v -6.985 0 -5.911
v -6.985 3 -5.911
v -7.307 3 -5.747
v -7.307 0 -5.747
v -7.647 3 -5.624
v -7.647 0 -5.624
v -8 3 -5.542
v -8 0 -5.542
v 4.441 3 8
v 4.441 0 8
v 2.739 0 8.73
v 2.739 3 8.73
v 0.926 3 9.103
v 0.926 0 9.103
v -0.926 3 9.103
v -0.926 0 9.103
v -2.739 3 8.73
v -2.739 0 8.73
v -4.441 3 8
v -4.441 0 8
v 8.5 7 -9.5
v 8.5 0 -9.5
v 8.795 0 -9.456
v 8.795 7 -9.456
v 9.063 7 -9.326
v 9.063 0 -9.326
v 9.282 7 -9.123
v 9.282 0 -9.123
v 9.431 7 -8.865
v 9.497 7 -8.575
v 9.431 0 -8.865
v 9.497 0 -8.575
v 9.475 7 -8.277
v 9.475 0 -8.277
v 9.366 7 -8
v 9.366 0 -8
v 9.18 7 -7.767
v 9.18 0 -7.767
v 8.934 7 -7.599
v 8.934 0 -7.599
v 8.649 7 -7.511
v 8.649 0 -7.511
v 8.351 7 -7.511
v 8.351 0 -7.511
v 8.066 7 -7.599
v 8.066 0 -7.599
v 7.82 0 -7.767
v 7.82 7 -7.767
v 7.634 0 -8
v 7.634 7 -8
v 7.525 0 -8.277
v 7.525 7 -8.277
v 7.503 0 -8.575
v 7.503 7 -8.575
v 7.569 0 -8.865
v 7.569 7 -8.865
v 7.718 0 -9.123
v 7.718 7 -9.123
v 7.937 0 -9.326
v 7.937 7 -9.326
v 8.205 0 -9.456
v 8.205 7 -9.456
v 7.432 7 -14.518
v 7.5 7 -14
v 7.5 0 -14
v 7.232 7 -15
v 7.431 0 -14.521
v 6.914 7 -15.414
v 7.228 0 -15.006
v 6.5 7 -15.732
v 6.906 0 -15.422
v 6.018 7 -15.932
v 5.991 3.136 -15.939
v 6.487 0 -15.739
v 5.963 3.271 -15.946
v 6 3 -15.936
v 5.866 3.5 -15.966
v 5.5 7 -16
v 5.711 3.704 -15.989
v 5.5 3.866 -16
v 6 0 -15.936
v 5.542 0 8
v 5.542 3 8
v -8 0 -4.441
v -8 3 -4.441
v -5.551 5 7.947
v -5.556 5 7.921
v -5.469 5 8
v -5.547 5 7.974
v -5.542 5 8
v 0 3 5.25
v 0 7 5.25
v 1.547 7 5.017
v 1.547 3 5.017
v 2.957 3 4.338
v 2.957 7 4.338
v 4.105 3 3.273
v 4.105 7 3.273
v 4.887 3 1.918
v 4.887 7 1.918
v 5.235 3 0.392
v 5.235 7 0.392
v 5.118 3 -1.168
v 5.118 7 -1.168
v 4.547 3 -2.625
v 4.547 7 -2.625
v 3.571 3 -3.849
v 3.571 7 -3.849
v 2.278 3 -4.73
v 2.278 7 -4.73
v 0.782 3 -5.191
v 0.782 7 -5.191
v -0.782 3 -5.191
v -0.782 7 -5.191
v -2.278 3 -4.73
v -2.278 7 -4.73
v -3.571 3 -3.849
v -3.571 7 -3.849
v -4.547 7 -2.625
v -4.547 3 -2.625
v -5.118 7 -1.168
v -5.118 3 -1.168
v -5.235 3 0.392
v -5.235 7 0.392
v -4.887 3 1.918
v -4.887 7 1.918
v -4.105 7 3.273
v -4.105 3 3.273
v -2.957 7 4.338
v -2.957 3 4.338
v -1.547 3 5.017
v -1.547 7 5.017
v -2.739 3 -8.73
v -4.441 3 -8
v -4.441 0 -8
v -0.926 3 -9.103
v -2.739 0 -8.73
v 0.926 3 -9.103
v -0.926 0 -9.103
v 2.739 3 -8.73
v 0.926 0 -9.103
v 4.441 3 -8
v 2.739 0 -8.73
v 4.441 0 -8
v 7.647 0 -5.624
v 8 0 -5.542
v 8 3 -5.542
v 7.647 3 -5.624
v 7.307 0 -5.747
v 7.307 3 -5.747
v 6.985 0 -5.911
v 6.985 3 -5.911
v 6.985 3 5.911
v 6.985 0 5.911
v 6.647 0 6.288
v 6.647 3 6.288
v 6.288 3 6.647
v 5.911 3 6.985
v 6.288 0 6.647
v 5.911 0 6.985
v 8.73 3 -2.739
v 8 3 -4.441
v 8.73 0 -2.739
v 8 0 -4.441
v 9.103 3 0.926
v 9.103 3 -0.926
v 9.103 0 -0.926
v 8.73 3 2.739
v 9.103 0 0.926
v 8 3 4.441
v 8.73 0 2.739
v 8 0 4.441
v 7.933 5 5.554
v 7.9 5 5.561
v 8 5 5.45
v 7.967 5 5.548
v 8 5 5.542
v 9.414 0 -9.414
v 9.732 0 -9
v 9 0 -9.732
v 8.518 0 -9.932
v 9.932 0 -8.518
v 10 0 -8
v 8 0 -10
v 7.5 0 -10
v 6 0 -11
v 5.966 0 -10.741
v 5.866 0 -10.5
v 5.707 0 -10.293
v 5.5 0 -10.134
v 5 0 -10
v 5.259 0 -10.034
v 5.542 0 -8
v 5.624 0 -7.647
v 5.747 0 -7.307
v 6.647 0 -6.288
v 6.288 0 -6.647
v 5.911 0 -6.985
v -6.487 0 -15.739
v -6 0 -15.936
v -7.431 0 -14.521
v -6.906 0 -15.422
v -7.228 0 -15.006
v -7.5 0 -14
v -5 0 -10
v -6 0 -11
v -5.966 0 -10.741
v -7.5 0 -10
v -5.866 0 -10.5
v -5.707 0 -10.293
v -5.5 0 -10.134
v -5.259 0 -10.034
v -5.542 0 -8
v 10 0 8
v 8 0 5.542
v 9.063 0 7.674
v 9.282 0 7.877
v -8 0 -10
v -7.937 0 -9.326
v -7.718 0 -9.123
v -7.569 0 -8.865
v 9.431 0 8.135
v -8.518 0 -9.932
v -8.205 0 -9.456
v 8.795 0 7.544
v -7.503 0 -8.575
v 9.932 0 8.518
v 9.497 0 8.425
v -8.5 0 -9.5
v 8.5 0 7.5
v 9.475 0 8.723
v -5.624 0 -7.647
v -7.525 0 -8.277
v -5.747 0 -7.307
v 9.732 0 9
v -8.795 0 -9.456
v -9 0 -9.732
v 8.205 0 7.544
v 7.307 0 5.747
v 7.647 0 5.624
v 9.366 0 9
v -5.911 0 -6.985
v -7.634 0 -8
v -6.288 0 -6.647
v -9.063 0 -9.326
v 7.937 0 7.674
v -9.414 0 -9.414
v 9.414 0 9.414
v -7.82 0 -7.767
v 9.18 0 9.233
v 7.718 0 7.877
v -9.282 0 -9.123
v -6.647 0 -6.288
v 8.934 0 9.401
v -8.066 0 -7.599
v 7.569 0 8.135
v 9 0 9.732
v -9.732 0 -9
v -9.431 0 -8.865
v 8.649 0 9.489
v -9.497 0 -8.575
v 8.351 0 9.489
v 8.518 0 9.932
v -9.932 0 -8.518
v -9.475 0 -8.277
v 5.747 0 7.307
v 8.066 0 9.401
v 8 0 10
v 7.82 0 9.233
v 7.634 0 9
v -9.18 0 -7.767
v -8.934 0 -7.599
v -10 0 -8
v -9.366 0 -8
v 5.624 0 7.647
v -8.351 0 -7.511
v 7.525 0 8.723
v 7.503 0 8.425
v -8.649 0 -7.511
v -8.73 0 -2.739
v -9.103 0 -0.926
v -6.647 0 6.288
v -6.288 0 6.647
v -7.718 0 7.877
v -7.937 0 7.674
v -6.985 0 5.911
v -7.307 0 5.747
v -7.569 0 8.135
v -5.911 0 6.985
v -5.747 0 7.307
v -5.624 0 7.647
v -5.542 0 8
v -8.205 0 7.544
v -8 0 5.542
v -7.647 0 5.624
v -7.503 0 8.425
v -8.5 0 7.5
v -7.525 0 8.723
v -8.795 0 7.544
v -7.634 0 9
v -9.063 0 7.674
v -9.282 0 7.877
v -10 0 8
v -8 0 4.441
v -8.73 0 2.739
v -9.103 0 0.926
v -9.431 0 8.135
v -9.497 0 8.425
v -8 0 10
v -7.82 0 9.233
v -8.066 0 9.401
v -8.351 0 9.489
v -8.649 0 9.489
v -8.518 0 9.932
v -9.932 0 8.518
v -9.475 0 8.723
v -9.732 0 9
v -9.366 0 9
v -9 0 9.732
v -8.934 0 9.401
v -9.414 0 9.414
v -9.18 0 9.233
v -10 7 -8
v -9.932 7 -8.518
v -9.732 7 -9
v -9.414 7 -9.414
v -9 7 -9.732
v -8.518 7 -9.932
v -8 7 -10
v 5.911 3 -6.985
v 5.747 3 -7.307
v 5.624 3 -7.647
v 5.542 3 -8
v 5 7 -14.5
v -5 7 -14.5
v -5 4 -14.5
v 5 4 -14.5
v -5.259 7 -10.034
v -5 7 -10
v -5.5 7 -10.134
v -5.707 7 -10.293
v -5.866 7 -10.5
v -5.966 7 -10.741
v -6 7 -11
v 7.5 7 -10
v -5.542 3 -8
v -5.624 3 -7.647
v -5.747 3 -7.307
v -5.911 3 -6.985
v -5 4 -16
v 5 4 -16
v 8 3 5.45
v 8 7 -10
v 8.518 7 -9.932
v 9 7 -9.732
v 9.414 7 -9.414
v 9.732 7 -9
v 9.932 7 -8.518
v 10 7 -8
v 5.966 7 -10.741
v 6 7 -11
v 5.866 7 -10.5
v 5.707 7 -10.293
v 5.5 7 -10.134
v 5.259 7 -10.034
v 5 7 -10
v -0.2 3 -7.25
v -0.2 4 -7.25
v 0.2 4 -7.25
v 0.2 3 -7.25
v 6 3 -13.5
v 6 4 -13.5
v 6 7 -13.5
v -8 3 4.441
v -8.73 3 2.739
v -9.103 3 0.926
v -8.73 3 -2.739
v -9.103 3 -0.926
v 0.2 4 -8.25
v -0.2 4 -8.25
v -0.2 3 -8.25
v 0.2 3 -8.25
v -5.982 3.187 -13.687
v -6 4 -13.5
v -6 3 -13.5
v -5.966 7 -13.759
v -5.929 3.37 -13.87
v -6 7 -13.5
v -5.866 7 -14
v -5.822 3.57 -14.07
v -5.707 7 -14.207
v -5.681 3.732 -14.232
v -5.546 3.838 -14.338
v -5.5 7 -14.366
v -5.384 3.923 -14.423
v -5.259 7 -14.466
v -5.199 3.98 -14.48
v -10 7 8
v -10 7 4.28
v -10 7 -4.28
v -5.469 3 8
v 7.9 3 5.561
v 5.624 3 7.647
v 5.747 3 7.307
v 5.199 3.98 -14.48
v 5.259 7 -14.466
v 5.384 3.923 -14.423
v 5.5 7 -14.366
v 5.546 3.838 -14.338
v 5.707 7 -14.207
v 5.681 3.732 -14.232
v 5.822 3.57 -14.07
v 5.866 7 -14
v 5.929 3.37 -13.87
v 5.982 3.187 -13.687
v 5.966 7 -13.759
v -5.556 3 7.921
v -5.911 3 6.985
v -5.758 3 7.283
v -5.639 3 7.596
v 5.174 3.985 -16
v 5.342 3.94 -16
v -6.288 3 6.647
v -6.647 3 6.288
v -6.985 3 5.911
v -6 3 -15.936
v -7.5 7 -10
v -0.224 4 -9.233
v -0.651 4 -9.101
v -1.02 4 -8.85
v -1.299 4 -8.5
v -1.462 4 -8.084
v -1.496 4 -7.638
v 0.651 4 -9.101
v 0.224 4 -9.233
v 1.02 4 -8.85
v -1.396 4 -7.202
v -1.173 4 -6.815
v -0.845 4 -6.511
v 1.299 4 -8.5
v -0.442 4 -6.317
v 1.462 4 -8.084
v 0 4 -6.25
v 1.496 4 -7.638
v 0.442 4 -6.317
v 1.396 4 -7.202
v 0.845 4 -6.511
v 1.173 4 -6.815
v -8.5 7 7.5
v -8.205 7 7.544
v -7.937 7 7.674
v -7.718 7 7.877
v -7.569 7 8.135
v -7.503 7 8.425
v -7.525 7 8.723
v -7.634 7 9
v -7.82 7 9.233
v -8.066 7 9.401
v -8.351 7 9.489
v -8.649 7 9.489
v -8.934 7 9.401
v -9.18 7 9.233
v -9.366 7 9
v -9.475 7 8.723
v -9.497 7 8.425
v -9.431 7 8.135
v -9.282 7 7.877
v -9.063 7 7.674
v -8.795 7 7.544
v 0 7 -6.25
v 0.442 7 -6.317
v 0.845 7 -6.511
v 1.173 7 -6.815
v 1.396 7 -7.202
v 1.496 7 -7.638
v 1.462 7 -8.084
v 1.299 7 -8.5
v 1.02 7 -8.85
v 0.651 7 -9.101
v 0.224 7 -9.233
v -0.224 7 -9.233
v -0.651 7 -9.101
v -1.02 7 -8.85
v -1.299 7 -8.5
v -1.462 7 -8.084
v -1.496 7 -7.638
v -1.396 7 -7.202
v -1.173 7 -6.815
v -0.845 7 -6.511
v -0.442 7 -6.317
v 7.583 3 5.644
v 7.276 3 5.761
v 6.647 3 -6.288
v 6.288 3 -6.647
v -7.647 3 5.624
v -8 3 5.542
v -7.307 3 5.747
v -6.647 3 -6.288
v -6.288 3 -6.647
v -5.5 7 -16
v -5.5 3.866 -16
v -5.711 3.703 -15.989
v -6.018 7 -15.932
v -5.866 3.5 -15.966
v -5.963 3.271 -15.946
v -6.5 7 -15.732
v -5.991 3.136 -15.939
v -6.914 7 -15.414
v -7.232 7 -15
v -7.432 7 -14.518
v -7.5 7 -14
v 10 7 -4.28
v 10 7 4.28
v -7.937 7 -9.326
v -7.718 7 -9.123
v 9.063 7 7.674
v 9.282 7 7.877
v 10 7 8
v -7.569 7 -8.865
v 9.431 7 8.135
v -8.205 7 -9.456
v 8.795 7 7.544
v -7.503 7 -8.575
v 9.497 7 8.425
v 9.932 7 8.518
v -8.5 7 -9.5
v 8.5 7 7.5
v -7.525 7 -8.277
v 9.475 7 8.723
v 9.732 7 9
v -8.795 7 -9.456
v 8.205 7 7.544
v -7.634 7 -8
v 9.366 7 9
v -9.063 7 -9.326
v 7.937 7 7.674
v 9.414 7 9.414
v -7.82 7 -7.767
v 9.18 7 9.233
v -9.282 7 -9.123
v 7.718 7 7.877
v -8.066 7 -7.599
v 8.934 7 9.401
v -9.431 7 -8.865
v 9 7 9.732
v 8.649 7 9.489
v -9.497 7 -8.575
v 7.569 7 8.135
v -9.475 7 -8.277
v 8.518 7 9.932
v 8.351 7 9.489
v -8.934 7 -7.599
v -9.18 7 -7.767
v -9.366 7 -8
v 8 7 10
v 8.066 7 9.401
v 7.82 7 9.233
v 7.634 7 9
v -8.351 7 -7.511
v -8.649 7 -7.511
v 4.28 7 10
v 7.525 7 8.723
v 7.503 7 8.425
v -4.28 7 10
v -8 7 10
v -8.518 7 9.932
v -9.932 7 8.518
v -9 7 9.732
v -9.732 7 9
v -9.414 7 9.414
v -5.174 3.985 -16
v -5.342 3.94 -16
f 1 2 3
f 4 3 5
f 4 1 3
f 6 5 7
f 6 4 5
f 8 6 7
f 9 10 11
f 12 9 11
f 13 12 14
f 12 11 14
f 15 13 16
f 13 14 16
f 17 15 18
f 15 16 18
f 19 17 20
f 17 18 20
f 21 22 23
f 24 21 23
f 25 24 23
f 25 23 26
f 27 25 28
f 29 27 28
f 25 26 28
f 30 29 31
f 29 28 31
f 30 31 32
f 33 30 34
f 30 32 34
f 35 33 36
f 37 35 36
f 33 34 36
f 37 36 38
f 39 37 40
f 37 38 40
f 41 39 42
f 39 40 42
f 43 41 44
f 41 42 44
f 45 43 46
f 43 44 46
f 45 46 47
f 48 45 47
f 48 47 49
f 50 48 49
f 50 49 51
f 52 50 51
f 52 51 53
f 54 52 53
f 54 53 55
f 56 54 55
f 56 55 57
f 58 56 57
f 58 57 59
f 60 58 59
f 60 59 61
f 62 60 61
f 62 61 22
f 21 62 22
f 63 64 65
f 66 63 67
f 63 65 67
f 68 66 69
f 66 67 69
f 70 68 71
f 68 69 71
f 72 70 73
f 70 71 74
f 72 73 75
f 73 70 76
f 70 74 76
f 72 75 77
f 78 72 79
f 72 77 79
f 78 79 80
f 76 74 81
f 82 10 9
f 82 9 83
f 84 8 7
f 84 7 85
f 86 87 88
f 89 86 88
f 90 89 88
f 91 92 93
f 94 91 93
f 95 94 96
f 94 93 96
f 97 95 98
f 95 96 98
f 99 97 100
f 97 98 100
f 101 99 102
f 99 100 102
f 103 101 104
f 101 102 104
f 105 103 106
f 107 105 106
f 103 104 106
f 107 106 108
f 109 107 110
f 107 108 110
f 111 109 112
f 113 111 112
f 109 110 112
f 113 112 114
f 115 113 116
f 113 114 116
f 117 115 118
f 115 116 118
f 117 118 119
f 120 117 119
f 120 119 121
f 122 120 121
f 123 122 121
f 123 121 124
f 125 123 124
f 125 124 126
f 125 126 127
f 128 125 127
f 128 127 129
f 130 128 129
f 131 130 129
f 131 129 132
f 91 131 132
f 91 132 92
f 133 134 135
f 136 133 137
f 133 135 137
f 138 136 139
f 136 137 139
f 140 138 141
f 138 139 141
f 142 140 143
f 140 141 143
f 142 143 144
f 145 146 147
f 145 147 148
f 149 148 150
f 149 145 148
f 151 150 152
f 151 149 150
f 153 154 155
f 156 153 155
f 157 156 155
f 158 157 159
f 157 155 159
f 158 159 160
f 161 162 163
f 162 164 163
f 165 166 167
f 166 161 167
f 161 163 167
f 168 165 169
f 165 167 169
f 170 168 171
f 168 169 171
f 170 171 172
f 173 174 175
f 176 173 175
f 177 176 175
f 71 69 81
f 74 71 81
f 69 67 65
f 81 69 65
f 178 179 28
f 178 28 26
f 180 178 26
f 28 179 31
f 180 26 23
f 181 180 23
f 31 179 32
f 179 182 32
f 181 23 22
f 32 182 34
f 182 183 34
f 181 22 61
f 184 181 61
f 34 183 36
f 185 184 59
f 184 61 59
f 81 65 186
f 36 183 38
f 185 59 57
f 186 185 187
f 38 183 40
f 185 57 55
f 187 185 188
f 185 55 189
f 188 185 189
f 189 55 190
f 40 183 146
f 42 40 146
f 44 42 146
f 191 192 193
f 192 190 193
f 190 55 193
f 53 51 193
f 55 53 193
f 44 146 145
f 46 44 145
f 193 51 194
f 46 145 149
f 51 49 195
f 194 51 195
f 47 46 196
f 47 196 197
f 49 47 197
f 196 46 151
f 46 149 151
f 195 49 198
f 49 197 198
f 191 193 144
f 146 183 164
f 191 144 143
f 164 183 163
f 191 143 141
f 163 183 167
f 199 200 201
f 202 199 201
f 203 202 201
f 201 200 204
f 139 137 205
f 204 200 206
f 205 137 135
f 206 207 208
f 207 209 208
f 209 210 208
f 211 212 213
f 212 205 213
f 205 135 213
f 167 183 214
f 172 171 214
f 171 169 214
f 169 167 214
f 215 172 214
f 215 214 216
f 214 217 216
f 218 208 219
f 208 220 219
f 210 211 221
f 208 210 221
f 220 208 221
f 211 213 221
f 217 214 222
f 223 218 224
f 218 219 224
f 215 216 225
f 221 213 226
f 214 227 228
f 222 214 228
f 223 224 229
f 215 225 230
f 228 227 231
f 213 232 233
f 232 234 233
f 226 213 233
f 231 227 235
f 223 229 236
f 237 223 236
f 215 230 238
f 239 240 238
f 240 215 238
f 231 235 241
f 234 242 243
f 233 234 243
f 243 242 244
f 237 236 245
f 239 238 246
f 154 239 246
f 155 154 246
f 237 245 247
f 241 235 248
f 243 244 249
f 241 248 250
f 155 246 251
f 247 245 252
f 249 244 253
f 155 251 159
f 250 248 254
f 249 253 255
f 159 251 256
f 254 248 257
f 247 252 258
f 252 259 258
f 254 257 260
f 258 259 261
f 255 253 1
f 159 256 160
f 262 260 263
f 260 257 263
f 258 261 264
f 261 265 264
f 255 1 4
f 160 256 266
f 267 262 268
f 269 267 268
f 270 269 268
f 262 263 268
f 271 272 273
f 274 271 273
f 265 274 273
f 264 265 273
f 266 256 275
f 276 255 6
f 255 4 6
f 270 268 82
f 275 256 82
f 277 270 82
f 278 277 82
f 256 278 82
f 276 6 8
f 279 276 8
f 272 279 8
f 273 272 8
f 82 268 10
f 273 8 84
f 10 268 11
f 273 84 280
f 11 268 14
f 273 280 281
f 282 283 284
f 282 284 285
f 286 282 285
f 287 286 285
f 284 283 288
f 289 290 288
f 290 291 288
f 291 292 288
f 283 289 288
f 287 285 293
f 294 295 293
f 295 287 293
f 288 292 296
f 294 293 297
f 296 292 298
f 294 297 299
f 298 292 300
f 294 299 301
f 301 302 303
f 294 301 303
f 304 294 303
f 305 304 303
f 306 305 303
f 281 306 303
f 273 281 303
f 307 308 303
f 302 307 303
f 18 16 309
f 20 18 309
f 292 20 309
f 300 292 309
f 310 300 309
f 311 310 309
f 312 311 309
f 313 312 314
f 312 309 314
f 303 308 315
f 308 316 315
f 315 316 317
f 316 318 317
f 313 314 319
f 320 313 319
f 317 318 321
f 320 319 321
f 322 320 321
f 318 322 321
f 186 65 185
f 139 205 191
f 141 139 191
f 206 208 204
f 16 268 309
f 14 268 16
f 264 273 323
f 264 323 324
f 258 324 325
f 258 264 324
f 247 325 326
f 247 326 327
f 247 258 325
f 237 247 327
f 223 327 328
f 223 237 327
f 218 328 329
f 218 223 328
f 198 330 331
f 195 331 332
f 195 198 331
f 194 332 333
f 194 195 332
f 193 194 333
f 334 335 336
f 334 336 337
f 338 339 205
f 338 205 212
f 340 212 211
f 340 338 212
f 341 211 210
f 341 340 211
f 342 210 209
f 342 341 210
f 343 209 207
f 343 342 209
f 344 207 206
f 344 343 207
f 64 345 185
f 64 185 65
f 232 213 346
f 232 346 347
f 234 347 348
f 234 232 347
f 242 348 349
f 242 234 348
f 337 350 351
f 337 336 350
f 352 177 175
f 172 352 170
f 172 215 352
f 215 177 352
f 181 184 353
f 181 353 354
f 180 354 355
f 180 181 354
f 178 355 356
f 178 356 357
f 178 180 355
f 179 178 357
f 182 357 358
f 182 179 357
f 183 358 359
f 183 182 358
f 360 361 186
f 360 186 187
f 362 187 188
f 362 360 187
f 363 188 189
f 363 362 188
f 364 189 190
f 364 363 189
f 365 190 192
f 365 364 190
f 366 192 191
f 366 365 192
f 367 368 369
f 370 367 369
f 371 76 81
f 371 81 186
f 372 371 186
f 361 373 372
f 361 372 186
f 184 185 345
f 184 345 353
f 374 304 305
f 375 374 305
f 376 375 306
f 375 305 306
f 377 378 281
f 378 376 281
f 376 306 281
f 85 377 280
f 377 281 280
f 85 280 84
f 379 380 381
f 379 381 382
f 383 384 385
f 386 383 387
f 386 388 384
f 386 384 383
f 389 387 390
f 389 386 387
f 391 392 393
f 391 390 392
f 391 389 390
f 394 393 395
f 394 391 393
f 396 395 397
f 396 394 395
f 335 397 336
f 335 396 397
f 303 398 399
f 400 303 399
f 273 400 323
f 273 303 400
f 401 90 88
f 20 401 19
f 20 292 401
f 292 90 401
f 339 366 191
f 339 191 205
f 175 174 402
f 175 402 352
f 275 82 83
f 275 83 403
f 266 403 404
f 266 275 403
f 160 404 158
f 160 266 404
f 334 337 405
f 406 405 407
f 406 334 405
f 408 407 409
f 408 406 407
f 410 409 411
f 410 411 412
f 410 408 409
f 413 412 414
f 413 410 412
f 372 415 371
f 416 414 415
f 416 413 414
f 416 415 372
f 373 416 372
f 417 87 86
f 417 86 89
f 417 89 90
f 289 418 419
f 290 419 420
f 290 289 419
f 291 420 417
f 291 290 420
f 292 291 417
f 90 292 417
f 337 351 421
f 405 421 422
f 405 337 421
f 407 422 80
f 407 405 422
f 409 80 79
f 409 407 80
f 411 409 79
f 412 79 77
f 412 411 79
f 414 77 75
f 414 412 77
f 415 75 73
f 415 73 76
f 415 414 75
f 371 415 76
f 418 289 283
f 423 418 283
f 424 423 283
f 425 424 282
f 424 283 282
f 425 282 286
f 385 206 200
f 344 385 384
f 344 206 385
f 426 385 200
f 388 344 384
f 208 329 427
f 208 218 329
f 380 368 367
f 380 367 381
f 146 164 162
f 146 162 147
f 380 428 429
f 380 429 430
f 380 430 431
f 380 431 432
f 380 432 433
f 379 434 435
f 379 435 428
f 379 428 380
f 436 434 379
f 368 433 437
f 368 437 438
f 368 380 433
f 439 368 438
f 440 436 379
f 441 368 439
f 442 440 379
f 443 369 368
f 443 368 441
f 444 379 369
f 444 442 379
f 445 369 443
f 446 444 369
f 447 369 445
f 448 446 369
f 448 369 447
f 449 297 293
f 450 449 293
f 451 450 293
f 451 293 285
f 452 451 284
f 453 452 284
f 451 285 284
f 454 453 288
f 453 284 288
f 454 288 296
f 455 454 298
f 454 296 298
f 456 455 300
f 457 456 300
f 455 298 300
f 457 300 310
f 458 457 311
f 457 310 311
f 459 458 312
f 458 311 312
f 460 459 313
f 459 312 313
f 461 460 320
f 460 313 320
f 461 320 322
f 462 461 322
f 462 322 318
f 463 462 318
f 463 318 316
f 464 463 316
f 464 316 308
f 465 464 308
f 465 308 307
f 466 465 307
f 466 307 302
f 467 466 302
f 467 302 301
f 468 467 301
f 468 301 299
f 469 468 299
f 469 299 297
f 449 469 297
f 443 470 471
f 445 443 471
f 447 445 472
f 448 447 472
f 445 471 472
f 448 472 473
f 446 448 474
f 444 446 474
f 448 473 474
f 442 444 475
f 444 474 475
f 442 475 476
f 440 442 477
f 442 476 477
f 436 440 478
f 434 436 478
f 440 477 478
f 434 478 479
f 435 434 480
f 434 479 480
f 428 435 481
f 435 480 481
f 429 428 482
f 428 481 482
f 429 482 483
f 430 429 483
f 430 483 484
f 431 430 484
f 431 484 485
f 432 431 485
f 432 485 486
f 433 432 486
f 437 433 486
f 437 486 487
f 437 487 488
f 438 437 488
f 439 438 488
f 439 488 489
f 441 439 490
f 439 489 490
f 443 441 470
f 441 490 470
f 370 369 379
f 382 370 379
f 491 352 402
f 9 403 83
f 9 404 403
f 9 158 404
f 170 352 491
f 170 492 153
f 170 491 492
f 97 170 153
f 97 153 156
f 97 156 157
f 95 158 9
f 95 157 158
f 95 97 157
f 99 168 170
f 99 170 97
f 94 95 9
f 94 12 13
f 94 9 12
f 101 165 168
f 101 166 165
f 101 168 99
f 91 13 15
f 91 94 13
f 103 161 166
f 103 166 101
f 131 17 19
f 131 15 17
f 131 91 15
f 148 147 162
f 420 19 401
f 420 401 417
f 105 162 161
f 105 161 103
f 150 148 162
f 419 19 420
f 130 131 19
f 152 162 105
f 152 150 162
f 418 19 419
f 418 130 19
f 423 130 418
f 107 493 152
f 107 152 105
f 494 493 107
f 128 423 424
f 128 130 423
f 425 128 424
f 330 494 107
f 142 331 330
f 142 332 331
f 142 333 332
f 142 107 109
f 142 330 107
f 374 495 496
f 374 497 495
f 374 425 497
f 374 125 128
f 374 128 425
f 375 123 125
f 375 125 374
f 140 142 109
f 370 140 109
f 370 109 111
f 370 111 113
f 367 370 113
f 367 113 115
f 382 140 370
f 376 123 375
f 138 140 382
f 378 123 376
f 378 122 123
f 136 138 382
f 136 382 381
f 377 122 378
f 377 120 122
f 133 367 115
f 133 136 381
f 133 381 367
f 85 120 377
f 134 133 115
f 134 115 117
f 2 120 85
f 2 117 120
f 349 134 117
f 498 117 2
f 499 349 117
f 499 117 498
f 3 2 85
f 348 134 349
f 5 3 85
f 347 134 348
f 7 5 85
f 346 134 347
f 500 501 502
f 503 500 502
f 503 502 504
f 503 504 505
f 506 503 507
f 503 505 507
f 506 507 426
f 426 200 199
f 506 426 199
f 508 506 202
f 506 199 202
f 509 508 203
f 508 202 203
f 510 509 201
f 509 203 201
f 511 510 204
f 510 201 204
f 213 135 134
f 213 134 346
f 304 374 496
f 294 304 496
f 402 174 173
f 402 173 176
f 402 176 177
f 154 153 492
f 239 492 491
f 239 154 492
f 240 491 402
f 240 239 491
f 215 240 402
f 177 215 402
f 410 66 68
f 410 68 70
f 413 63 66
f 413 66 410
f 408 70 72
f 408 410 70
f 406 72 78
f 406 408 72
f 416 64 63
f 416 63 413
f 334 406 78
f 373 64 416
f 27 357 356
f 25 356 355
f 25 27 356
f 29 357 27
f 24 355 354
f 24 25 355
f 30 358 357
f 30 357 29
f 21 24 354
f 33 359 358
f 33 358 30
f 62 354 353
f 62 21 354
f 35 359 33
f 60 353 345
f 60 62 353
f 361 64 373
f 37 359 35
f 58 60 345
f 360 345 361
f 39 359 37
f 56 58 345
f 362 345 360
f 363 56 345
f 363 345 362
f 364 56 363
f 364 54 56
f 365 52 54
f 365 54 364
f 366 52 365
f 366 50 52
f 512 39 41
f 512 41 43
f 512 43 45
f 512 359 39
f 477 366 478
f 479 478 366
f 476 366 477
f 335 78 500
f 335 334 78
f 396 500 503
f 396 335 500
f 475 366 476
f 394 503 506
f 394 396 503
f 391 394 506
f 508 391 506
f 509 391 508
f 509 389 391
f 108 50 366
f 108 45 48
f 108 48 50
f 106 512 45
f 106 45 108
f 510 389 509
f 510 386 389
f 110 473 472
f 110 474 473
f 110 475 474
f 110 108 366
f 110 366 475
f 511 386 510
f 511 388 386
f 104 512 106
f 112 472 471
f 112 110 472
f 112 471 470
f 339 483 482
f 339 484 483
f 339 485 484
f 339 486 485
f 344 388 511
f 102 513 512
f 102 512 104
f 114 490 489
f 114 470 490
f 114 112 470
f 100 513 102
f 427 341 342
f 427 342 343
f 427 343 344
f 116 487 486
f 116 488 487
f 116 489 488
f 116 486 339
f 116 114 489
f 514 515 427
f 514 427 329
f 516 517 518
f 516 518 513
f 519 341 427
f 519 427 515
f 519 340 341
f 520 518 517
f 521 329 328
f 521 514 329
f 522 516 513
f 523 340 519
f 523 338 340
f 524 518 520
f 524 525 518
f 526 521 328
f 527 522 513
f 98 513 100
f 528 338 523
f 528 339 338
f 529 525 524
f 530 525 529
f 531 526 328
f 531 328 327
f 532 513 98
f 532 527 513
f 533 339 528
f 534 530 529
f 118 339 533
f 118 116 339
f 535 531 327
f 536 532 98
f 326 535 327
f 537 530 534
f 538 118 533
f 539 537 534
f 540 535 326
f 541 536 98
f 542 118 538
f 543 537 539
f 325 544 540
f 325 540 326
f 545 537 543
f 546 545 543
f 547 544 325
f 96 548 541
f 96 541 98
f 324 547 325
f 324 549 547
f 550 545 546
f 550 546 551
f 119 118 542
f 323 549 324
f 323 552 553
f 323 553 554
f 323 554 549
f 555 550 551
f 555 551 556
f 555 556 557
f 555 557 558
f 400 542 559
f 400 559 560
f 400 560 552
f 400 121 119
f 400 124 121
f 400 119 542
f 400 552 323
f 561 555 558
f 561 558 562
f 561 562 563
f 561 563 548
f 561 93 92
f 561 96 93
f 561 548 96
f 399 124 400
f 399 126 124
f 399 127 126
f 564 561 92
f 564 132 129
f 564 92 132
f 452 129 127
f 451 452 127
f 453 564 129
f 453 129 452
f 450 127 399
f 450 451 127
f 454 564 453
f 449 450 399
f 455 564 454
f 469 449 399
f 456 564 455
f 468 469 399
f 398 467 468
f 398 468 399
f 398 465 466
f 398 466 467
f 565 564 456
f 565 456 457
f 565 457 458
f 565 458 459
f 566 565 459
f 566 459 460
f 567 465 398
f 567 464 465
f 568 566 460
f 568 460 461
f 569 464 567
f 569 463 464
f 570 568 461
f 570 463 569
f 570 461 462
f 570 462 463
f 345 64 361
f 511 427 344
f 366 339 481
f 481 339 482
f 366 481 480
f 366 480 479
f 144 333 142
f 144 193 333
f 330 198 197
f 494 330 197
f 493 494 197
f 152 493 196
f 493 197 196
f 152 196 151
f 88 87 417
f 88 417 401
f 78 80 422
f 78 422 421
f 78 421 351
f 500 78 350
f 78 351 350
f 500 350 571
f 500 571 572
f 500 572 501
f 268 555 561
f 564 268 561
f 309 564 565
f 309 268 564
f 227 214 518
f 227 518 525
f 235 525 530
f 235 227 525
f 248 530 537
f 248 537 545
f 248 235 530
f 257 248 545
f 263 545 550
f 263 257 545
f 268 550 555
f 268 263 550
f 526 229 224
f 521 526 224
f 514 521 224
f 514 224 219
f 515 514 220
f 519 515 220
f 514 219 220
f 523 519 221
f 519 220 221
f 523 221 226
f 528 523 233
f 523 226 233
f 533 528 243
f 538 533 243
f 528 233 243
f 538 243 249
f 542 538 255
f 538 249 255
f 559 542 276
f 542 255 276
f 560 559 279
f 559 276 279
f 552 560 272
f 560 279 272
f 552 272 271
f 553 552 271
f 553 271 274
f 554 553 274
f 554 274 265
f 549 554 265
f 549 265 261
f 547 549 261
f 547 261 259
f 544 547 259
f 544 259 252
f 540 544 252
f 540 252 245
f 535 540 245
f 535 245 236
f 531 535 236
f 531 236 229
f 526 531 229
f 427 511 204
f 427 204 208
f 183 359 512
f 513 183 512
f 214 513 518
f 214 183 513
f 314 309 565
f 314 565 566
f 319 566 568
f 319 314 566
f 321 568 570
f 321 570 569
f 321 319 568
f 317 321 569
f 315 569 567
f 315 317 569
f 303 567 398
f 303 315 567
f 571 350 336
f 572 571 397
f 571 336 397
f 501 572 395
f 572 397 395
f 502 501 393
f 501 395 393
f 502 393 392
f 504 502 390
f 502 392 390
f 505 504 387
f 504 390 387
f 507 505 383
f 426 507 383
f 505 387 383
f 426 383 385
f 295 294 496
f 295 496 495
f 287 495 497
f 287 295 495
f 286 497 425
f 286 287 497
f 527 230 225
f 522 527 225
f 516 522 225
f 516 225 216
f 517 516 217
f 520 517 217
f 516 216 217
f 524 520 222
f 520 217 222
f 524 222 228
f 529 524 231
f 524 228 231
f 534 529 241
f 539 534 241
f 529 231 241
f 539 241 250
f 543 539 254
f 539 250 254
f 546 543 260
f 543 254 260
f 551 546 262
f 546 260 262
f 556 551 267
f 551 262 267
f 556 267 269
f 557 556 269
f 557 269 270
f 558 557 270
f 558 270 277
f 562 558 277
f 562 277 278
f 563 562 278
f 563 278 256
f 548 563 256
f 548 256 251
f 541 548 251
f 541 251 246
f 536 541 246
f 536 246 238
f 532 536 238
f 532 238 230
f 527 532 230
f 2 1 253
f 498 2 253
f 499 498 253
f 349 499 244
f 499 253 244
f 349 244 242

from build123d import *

# Parameters (mm, degrees)
BOSS_EXTRUDE1_DEPTH = 12
SKETCH2_R           = 1
CUT_EXTRUDE1_DEPTH  = 15
SKETCH4_R           = 2.25
CUT_EXTRUDE3_DEPTH  = 5
SHELL1_DEPTH        = 10
SHELL1_2_DEPTH      = 5
SKETCH3_R           = 9.15
CUT_EXTRUDE2_DEPTH  = 3
FILLET1_R           = 2
BOSS_EXTRUDE2_DEPTH = 7
SKETCH7_W           = 12
SKETCH7_H           = 4.549017994
CUT_EXTRUDE4_DEPTH  = 4
SKETCH8_W           = 27.297760414
SKETCH8_H           = 10.352522689
CUT_EXTRUDE5_DEPTH  = 33
BOSS_EXTRUDE8_DEPTH = 4
SKETCH11_R          = 5.5
CUT_EXTRUDE6_DEPTH  = 4
SKETCH12_R          = 1.5
CUT_EXTRUDE7_DEPTH  = 3
SKETCH13_W          = 0.4
SKETCH13_H          = 1
CUT_EXTRUDE8_DEPTH  = 5
CUT_EXTRUDE9_DEPTH  = 15
FILLET2_R           = 1
BOSS_EXTRUDE9_DEPTH = 4
SKETCH16_R          = 5.25
CUT_EXTRUDE10_DEPTH = 5.1


# Read off the part's stored shape, not the designer's step: Shell1
with BuildPart() as part:
    # Sketch1 → Boss-Extrude1 (new body)
    with BuildSketch(Plane(origin=(0, 0, 0), x_dir=(1, 0, 0), z_dir=(0, 1, 0))):
        with BuildLine():
            Line((-8, 10), (8, 10))
            ThreePointArc((8, 10), (9.414213562, 9.414213562), (10, 8))
            Line((10, 8), (10, -8))
            ThreePointArc((10, -8), (9.414213562, -9.414213562), (8, -10))
            Line((8, -10), (-8, -10))
            ThreePointArc((-8, -10), (-9.414213562, -9.414213562), (-10, -8))
            Line((-10, -8), (-10, 8))
            ThreePointArc((-10, 8), (-9.414213562, 9.414213562), (-8, 10))
        make_face()
    extrude(amount=BOSS_EXTRUDE1_DEPTH)

    # Sketch2 → Cut-Extrude1 (cut)
    with BuildSketch(Plane.XZ):
        with Locations(Location((-8.5, 8.5, 0), (0, 0, 270))):
            Circle(SKETCH2_R)
        with Locations(Location((8.5, 8.5, 0), (0, 0, 270))):
            Circle(SKETCH2_R)
        with Locations(Location((8.5, -8.5, 0), (0, 0, 270))):
            Circle(SKETCH2_R)
        with Locations(Location((-8.5, -8.5, 0), (0, 0, 270))):
            Circle(SKETCH2_R)
    extrude(amount=-CUT_EXTRUDE1_DEPTH, mode=Mode.SUBTRACT)

    # Sketch4 → Cut-Extrude3 (cut)
    with BuildSketch(Plane(origin=(0, 12, 0), x_dir=(1, 0, 0), z_dir=(0, 1, 0))):
        with Locations((8.5, -8.5)):
            Circle(SKETCH4_R)
        with Locations((-8.5, -8.5)):
            Circle(SKETCH4_R)
        with Locations((-8.5, 8.5)):
            Circle(SKETCH4_R)
        with Locations((8.5, 8.5)):
            Circle(SKETCH4_R)
    extrude(amount=-CUT_EXTRUDE3_DEPTH, mode=Mode.SUBTRACT)

    # Shell1 outline → Shell1 (cut)
    with BuildSketch(Plane(origin=(0, 0, 0), x_dir=(1, 0, 0), z_dir=(0, 1, 0))):
        with BuildLine():
            Line((-4.279514246, -8), (4.279514246, -8))
            ThreePointArc((4.279514246, -8), (5.49479618, -5.49479618), (8, -4.279514246))
            Line((8, -4.279514246), (8, 4.279514246))
            ThreePointArc((8, 4.279514246), (5.49479618, 5.49479618), (4.279514246, 8))
            Line((4.279514246, 8), (-4.279514246, 8))
            ThreePointArc((-4.279514246, 8), (-5.49479618, 5.49479618), (-8, 4.279514246))
            Line((-8, 4.279514246), (-8, -4.279514246))
            ThreePointArc((-8, -4.279514246), (-5.49479618, -5.49479618), (-4.279514246, -8))
        make_face()
    extrude(amount=SHELL1_DEPTH, mode=Mode.SUBTRACT)

    # Shell1 2 outline → Shell1 2 (cut)
    with BuildSketch(Plane(origin=(0, 0, 0), x_dir=(1, 0, 0), z_dir=(0, 1, 0))):
        with BuildLine():
            Line((4.279514246, -8), (5.541960108, -8))
            ThreePointArc((5.541960108, -8), (6.378679656, -6.378679656), (8, -5.541960108))
            Line((8, -5.541960108), (8, -4.279514246))
            ThreePointArc((8, -4.279514246), (5.49479618, -5.49479618), (4.279514246, -8))
        make_face()
        with BuildLine():
            Line((-5.541960108, -8), (-4.279514246, -8))
            ThreePointArc((-4.279514246, -8), (-5.49479618, -5.49479618), (-8, -4.279514246))
            Line((-8, -4.279514246), (-8, -5.541960108))
            ThreePointArc((-8, -5.541960108), (-6.378679656, -6.378679656), (-5.541960108, -8))
        make_face()
        with BuildLine():
            ThreePointArc((4.279514246, 8), (5.49479618, 5.49479618), (8, 4.279514246))
            Line((8, 4.279514246), (8, 5.541960108))
            ThreePointArc((8, 5.541960108), (6.378679656, 6.378679656), (5.541960108, 8))
            Line((5.541960108, 8), (4.279514246, 8))
        make_face()
        with BuildLine():
            Line((-8, 5.541960108), (-8, 4.279514246))
            ThreePointArc((-8, 4.279514246), (-5.49479618, 5.49479618), (-4.279514246, 8))
            Line((-4.279514246, 8), (-5.541960108, 8))
            ThreePointArc((-5.541960108, 8), (-6.378679656, 6.378679656), (-8, 5.541960108))
        make_face()
    extrude(amount=SHELL1_2_DEPTH, mode=Mode.SUBTRACT)

    # Sketch3 → Cut-Extrude2 (cut)
    with BuildSketch(Plane.XZ):
        Circle(SKETCH3_R)
    extrude(amount=-CUT_EXTRUDE2_DEPTH, mode=Mode.SUBTRACT)

    # Fillet1
    fillet1_edges = [part.edges().sort_by_distance(p)[0] for p in [
        (6.822949017, 9.5, -10),
        (10, 9.5, -6.822949017),
        (-6.822949017, 9.5, -10),
        (-10, 9.5, -6.822949017),
        (-10, 9.5, 6.822949017),
        (-6.822949017, 9.5, 10),
        (6.822949017, 9.5, 10),
        (10, 9.5, 6.822949017),
    ]]
    fillet(fillet1_edges, radius=FILLET1_R)

    # Sketch6 → Boss-Extrude2 (add)
    with BuildSketch(Plane.XZ):
        with BuildLine():
            Line((-7.5, -10), (7.5, -10))
            Line((7.5, -10), (7.5, -14))
            ThreePointArc((7.5, -14), (6.914213562, -15.414213562), (5.5, -16))
            Line((5.5, -16), (-5.5, -16))
            ThreePointArc((-5.5, -16), (-6.914213562, -15.414213562), (-7.5, -14))
            Line((-7.5, -14), (-7.5, -10))
        make_face()
    extrude(amount=-BOSS_EXTRUDE2_DEPTH)

    # Sketch7 → Cut-Extrude4 (cut)
    with BuildSketch(Plane.XZ):
        with Locations((0, -13.725491003)):
            Rectangle(SKETCH7_W, SKETCH7_H)
    extrude(amount=-CUT_EXTRUDE4_DEPTH, mode=Mode.SUBTRACT)

    # Sketch8 → Cut-Extrude5 (cut)
    with BuildSketch(Plane(origin=(10, 0, 0), x_dir=(0, 0, -1), z_dir=(1, 0, 0))):
        with Locations((3.648880207, 12.176261345)):
            Rectangle(SKETCH8_W, SKETCH8_H)
    extrude(amount=-CUT_EXTRUDE5_DEPTH, mode=Mode.SUBTRACT)

    # Sketch10 → Boss-Extrude8 (add)
    with BuildSketch(Plane(origin=(0, 7, 0), x_dir=(1, 0, 0), z_dir=(0, 1, 0))):
        Polygon((9.294915126, 4.441002139), (-9.072540785, 4.441002139), (-5.843708737, 9.485613806), (6.066083078, 9.485613806), align=None)
    extrude(amount=-BOSS_EXTRUDE8_DEPTH)

    # Sketch11 → Cut-Extrude6 (cut)
    with BuildSketch(Plane.XZ.offset(-3)):
        Circle(SKETCH11_R)
    extrude(amount=-CUT_EXTRUDE6_DEPTH, mode=Mode.SUBTRACT)

    # Sketch12 → Cut-Extrude7 (cut)
    with BuildSketch(Plane(origin=(0, 7, 0), x_dir=(1, 0, 0), z_dir=(0, 1, 0))):
        with Locations(Location((0, 7.75, 0), (0, 0, 270))):
            Circle(SKETCH12_R)
    extrude(amount=-CUT_EXTRUDE7_DEPTH, mode=Mode.SUBTRACT)

    # Sketch13 → Cut-Extrude8 (cut)
    with BuildSketch(Plane(origin=(0, 4, 0), x_dir=(1, 0, 0), z_dir=(0, 1, 0))):
        with Locations((0, 7.75)):
            Rectangle(SKETCH13_W, SKETCH13_H)
    extrude(amount=-CUT_EXTRUDE8_DEPTH, mode=Mode.SUBTRACT)

    # Sketch14 → Cut-Extrude9 (cut)
    with BuildSketch(Plane(origin=(0, 7, 0), x_dir=(1, 0, 0), z_dir=(0, 1, 0))):
        with BuildLine():
            Line((-5, 14.5), (5, 14.5))
            ThreePointArc((5, 14.5), (5.707106781, 14.207106781), (6, 13.5))
            Line((6, 13.5), (6, 11))
            ThreePointArc((6, 11), (5.707106781, 10.292893219), (5, 10))
            Line((5, 10), (-5, 10))
            ThreePointArc((-5, 10), (-5.707106781, 10.292893219), (-6, 11))
            Line((-6, 11), (-6, 13.5))
            ThreePointArc((-6, 13.5), (-5.707106781, 14.207106781), (-5, 14.5))
        make_face()
    extrude(amount=-CUT_EXTRUDE9_DEPTH, mode=Mode.SUBTRACT)

    # Fillet2
    fillet2_edges = [part.edges().sort_by_distance(p)[0] for p in [
        (-6, 4, -14.718245837),
        (6, 4, -14.718245837),
    ]]
    fillet(fillet2_edges, radius=FILLET2_R)

    # Sketch15 → Boss-Extrude9 (add)
    with BuildSketch(Plane(origin=(0, 7, 0), x_dir=(1, 0, 0), z_dir=(0, 1, 0))):
        Polygon((4.927887467, -8.83937155), (8.987059624, -4.361499915), (8.535312268, 4.849371277), (4.119785389, 6.639048991), (-3.498767695, 5.109974325), (-8.089855619, 5.874511658), (-8.702967098, -5.068680896), (-4.41401834, -8.956595244), align=None)
    extrude(amount=-BOSS_EXTRUDE9_DEPTH)

    # Sketch16 → Cut-Extrude10 (cut)
    with BuildSketch(Plane(origin=(0, 7, 0), x_dir=(1, 0, 0), z_dir=(0, 1, 0))):
        with Locations(Location((0, 0, 0), (0, 0, 270))):
            Circle(SKETCH16_R)
    extrude(amount=-CUT_EXTRUDE10_DEPTH, mode=Mode.SUBTRACT)


solid = part.part
